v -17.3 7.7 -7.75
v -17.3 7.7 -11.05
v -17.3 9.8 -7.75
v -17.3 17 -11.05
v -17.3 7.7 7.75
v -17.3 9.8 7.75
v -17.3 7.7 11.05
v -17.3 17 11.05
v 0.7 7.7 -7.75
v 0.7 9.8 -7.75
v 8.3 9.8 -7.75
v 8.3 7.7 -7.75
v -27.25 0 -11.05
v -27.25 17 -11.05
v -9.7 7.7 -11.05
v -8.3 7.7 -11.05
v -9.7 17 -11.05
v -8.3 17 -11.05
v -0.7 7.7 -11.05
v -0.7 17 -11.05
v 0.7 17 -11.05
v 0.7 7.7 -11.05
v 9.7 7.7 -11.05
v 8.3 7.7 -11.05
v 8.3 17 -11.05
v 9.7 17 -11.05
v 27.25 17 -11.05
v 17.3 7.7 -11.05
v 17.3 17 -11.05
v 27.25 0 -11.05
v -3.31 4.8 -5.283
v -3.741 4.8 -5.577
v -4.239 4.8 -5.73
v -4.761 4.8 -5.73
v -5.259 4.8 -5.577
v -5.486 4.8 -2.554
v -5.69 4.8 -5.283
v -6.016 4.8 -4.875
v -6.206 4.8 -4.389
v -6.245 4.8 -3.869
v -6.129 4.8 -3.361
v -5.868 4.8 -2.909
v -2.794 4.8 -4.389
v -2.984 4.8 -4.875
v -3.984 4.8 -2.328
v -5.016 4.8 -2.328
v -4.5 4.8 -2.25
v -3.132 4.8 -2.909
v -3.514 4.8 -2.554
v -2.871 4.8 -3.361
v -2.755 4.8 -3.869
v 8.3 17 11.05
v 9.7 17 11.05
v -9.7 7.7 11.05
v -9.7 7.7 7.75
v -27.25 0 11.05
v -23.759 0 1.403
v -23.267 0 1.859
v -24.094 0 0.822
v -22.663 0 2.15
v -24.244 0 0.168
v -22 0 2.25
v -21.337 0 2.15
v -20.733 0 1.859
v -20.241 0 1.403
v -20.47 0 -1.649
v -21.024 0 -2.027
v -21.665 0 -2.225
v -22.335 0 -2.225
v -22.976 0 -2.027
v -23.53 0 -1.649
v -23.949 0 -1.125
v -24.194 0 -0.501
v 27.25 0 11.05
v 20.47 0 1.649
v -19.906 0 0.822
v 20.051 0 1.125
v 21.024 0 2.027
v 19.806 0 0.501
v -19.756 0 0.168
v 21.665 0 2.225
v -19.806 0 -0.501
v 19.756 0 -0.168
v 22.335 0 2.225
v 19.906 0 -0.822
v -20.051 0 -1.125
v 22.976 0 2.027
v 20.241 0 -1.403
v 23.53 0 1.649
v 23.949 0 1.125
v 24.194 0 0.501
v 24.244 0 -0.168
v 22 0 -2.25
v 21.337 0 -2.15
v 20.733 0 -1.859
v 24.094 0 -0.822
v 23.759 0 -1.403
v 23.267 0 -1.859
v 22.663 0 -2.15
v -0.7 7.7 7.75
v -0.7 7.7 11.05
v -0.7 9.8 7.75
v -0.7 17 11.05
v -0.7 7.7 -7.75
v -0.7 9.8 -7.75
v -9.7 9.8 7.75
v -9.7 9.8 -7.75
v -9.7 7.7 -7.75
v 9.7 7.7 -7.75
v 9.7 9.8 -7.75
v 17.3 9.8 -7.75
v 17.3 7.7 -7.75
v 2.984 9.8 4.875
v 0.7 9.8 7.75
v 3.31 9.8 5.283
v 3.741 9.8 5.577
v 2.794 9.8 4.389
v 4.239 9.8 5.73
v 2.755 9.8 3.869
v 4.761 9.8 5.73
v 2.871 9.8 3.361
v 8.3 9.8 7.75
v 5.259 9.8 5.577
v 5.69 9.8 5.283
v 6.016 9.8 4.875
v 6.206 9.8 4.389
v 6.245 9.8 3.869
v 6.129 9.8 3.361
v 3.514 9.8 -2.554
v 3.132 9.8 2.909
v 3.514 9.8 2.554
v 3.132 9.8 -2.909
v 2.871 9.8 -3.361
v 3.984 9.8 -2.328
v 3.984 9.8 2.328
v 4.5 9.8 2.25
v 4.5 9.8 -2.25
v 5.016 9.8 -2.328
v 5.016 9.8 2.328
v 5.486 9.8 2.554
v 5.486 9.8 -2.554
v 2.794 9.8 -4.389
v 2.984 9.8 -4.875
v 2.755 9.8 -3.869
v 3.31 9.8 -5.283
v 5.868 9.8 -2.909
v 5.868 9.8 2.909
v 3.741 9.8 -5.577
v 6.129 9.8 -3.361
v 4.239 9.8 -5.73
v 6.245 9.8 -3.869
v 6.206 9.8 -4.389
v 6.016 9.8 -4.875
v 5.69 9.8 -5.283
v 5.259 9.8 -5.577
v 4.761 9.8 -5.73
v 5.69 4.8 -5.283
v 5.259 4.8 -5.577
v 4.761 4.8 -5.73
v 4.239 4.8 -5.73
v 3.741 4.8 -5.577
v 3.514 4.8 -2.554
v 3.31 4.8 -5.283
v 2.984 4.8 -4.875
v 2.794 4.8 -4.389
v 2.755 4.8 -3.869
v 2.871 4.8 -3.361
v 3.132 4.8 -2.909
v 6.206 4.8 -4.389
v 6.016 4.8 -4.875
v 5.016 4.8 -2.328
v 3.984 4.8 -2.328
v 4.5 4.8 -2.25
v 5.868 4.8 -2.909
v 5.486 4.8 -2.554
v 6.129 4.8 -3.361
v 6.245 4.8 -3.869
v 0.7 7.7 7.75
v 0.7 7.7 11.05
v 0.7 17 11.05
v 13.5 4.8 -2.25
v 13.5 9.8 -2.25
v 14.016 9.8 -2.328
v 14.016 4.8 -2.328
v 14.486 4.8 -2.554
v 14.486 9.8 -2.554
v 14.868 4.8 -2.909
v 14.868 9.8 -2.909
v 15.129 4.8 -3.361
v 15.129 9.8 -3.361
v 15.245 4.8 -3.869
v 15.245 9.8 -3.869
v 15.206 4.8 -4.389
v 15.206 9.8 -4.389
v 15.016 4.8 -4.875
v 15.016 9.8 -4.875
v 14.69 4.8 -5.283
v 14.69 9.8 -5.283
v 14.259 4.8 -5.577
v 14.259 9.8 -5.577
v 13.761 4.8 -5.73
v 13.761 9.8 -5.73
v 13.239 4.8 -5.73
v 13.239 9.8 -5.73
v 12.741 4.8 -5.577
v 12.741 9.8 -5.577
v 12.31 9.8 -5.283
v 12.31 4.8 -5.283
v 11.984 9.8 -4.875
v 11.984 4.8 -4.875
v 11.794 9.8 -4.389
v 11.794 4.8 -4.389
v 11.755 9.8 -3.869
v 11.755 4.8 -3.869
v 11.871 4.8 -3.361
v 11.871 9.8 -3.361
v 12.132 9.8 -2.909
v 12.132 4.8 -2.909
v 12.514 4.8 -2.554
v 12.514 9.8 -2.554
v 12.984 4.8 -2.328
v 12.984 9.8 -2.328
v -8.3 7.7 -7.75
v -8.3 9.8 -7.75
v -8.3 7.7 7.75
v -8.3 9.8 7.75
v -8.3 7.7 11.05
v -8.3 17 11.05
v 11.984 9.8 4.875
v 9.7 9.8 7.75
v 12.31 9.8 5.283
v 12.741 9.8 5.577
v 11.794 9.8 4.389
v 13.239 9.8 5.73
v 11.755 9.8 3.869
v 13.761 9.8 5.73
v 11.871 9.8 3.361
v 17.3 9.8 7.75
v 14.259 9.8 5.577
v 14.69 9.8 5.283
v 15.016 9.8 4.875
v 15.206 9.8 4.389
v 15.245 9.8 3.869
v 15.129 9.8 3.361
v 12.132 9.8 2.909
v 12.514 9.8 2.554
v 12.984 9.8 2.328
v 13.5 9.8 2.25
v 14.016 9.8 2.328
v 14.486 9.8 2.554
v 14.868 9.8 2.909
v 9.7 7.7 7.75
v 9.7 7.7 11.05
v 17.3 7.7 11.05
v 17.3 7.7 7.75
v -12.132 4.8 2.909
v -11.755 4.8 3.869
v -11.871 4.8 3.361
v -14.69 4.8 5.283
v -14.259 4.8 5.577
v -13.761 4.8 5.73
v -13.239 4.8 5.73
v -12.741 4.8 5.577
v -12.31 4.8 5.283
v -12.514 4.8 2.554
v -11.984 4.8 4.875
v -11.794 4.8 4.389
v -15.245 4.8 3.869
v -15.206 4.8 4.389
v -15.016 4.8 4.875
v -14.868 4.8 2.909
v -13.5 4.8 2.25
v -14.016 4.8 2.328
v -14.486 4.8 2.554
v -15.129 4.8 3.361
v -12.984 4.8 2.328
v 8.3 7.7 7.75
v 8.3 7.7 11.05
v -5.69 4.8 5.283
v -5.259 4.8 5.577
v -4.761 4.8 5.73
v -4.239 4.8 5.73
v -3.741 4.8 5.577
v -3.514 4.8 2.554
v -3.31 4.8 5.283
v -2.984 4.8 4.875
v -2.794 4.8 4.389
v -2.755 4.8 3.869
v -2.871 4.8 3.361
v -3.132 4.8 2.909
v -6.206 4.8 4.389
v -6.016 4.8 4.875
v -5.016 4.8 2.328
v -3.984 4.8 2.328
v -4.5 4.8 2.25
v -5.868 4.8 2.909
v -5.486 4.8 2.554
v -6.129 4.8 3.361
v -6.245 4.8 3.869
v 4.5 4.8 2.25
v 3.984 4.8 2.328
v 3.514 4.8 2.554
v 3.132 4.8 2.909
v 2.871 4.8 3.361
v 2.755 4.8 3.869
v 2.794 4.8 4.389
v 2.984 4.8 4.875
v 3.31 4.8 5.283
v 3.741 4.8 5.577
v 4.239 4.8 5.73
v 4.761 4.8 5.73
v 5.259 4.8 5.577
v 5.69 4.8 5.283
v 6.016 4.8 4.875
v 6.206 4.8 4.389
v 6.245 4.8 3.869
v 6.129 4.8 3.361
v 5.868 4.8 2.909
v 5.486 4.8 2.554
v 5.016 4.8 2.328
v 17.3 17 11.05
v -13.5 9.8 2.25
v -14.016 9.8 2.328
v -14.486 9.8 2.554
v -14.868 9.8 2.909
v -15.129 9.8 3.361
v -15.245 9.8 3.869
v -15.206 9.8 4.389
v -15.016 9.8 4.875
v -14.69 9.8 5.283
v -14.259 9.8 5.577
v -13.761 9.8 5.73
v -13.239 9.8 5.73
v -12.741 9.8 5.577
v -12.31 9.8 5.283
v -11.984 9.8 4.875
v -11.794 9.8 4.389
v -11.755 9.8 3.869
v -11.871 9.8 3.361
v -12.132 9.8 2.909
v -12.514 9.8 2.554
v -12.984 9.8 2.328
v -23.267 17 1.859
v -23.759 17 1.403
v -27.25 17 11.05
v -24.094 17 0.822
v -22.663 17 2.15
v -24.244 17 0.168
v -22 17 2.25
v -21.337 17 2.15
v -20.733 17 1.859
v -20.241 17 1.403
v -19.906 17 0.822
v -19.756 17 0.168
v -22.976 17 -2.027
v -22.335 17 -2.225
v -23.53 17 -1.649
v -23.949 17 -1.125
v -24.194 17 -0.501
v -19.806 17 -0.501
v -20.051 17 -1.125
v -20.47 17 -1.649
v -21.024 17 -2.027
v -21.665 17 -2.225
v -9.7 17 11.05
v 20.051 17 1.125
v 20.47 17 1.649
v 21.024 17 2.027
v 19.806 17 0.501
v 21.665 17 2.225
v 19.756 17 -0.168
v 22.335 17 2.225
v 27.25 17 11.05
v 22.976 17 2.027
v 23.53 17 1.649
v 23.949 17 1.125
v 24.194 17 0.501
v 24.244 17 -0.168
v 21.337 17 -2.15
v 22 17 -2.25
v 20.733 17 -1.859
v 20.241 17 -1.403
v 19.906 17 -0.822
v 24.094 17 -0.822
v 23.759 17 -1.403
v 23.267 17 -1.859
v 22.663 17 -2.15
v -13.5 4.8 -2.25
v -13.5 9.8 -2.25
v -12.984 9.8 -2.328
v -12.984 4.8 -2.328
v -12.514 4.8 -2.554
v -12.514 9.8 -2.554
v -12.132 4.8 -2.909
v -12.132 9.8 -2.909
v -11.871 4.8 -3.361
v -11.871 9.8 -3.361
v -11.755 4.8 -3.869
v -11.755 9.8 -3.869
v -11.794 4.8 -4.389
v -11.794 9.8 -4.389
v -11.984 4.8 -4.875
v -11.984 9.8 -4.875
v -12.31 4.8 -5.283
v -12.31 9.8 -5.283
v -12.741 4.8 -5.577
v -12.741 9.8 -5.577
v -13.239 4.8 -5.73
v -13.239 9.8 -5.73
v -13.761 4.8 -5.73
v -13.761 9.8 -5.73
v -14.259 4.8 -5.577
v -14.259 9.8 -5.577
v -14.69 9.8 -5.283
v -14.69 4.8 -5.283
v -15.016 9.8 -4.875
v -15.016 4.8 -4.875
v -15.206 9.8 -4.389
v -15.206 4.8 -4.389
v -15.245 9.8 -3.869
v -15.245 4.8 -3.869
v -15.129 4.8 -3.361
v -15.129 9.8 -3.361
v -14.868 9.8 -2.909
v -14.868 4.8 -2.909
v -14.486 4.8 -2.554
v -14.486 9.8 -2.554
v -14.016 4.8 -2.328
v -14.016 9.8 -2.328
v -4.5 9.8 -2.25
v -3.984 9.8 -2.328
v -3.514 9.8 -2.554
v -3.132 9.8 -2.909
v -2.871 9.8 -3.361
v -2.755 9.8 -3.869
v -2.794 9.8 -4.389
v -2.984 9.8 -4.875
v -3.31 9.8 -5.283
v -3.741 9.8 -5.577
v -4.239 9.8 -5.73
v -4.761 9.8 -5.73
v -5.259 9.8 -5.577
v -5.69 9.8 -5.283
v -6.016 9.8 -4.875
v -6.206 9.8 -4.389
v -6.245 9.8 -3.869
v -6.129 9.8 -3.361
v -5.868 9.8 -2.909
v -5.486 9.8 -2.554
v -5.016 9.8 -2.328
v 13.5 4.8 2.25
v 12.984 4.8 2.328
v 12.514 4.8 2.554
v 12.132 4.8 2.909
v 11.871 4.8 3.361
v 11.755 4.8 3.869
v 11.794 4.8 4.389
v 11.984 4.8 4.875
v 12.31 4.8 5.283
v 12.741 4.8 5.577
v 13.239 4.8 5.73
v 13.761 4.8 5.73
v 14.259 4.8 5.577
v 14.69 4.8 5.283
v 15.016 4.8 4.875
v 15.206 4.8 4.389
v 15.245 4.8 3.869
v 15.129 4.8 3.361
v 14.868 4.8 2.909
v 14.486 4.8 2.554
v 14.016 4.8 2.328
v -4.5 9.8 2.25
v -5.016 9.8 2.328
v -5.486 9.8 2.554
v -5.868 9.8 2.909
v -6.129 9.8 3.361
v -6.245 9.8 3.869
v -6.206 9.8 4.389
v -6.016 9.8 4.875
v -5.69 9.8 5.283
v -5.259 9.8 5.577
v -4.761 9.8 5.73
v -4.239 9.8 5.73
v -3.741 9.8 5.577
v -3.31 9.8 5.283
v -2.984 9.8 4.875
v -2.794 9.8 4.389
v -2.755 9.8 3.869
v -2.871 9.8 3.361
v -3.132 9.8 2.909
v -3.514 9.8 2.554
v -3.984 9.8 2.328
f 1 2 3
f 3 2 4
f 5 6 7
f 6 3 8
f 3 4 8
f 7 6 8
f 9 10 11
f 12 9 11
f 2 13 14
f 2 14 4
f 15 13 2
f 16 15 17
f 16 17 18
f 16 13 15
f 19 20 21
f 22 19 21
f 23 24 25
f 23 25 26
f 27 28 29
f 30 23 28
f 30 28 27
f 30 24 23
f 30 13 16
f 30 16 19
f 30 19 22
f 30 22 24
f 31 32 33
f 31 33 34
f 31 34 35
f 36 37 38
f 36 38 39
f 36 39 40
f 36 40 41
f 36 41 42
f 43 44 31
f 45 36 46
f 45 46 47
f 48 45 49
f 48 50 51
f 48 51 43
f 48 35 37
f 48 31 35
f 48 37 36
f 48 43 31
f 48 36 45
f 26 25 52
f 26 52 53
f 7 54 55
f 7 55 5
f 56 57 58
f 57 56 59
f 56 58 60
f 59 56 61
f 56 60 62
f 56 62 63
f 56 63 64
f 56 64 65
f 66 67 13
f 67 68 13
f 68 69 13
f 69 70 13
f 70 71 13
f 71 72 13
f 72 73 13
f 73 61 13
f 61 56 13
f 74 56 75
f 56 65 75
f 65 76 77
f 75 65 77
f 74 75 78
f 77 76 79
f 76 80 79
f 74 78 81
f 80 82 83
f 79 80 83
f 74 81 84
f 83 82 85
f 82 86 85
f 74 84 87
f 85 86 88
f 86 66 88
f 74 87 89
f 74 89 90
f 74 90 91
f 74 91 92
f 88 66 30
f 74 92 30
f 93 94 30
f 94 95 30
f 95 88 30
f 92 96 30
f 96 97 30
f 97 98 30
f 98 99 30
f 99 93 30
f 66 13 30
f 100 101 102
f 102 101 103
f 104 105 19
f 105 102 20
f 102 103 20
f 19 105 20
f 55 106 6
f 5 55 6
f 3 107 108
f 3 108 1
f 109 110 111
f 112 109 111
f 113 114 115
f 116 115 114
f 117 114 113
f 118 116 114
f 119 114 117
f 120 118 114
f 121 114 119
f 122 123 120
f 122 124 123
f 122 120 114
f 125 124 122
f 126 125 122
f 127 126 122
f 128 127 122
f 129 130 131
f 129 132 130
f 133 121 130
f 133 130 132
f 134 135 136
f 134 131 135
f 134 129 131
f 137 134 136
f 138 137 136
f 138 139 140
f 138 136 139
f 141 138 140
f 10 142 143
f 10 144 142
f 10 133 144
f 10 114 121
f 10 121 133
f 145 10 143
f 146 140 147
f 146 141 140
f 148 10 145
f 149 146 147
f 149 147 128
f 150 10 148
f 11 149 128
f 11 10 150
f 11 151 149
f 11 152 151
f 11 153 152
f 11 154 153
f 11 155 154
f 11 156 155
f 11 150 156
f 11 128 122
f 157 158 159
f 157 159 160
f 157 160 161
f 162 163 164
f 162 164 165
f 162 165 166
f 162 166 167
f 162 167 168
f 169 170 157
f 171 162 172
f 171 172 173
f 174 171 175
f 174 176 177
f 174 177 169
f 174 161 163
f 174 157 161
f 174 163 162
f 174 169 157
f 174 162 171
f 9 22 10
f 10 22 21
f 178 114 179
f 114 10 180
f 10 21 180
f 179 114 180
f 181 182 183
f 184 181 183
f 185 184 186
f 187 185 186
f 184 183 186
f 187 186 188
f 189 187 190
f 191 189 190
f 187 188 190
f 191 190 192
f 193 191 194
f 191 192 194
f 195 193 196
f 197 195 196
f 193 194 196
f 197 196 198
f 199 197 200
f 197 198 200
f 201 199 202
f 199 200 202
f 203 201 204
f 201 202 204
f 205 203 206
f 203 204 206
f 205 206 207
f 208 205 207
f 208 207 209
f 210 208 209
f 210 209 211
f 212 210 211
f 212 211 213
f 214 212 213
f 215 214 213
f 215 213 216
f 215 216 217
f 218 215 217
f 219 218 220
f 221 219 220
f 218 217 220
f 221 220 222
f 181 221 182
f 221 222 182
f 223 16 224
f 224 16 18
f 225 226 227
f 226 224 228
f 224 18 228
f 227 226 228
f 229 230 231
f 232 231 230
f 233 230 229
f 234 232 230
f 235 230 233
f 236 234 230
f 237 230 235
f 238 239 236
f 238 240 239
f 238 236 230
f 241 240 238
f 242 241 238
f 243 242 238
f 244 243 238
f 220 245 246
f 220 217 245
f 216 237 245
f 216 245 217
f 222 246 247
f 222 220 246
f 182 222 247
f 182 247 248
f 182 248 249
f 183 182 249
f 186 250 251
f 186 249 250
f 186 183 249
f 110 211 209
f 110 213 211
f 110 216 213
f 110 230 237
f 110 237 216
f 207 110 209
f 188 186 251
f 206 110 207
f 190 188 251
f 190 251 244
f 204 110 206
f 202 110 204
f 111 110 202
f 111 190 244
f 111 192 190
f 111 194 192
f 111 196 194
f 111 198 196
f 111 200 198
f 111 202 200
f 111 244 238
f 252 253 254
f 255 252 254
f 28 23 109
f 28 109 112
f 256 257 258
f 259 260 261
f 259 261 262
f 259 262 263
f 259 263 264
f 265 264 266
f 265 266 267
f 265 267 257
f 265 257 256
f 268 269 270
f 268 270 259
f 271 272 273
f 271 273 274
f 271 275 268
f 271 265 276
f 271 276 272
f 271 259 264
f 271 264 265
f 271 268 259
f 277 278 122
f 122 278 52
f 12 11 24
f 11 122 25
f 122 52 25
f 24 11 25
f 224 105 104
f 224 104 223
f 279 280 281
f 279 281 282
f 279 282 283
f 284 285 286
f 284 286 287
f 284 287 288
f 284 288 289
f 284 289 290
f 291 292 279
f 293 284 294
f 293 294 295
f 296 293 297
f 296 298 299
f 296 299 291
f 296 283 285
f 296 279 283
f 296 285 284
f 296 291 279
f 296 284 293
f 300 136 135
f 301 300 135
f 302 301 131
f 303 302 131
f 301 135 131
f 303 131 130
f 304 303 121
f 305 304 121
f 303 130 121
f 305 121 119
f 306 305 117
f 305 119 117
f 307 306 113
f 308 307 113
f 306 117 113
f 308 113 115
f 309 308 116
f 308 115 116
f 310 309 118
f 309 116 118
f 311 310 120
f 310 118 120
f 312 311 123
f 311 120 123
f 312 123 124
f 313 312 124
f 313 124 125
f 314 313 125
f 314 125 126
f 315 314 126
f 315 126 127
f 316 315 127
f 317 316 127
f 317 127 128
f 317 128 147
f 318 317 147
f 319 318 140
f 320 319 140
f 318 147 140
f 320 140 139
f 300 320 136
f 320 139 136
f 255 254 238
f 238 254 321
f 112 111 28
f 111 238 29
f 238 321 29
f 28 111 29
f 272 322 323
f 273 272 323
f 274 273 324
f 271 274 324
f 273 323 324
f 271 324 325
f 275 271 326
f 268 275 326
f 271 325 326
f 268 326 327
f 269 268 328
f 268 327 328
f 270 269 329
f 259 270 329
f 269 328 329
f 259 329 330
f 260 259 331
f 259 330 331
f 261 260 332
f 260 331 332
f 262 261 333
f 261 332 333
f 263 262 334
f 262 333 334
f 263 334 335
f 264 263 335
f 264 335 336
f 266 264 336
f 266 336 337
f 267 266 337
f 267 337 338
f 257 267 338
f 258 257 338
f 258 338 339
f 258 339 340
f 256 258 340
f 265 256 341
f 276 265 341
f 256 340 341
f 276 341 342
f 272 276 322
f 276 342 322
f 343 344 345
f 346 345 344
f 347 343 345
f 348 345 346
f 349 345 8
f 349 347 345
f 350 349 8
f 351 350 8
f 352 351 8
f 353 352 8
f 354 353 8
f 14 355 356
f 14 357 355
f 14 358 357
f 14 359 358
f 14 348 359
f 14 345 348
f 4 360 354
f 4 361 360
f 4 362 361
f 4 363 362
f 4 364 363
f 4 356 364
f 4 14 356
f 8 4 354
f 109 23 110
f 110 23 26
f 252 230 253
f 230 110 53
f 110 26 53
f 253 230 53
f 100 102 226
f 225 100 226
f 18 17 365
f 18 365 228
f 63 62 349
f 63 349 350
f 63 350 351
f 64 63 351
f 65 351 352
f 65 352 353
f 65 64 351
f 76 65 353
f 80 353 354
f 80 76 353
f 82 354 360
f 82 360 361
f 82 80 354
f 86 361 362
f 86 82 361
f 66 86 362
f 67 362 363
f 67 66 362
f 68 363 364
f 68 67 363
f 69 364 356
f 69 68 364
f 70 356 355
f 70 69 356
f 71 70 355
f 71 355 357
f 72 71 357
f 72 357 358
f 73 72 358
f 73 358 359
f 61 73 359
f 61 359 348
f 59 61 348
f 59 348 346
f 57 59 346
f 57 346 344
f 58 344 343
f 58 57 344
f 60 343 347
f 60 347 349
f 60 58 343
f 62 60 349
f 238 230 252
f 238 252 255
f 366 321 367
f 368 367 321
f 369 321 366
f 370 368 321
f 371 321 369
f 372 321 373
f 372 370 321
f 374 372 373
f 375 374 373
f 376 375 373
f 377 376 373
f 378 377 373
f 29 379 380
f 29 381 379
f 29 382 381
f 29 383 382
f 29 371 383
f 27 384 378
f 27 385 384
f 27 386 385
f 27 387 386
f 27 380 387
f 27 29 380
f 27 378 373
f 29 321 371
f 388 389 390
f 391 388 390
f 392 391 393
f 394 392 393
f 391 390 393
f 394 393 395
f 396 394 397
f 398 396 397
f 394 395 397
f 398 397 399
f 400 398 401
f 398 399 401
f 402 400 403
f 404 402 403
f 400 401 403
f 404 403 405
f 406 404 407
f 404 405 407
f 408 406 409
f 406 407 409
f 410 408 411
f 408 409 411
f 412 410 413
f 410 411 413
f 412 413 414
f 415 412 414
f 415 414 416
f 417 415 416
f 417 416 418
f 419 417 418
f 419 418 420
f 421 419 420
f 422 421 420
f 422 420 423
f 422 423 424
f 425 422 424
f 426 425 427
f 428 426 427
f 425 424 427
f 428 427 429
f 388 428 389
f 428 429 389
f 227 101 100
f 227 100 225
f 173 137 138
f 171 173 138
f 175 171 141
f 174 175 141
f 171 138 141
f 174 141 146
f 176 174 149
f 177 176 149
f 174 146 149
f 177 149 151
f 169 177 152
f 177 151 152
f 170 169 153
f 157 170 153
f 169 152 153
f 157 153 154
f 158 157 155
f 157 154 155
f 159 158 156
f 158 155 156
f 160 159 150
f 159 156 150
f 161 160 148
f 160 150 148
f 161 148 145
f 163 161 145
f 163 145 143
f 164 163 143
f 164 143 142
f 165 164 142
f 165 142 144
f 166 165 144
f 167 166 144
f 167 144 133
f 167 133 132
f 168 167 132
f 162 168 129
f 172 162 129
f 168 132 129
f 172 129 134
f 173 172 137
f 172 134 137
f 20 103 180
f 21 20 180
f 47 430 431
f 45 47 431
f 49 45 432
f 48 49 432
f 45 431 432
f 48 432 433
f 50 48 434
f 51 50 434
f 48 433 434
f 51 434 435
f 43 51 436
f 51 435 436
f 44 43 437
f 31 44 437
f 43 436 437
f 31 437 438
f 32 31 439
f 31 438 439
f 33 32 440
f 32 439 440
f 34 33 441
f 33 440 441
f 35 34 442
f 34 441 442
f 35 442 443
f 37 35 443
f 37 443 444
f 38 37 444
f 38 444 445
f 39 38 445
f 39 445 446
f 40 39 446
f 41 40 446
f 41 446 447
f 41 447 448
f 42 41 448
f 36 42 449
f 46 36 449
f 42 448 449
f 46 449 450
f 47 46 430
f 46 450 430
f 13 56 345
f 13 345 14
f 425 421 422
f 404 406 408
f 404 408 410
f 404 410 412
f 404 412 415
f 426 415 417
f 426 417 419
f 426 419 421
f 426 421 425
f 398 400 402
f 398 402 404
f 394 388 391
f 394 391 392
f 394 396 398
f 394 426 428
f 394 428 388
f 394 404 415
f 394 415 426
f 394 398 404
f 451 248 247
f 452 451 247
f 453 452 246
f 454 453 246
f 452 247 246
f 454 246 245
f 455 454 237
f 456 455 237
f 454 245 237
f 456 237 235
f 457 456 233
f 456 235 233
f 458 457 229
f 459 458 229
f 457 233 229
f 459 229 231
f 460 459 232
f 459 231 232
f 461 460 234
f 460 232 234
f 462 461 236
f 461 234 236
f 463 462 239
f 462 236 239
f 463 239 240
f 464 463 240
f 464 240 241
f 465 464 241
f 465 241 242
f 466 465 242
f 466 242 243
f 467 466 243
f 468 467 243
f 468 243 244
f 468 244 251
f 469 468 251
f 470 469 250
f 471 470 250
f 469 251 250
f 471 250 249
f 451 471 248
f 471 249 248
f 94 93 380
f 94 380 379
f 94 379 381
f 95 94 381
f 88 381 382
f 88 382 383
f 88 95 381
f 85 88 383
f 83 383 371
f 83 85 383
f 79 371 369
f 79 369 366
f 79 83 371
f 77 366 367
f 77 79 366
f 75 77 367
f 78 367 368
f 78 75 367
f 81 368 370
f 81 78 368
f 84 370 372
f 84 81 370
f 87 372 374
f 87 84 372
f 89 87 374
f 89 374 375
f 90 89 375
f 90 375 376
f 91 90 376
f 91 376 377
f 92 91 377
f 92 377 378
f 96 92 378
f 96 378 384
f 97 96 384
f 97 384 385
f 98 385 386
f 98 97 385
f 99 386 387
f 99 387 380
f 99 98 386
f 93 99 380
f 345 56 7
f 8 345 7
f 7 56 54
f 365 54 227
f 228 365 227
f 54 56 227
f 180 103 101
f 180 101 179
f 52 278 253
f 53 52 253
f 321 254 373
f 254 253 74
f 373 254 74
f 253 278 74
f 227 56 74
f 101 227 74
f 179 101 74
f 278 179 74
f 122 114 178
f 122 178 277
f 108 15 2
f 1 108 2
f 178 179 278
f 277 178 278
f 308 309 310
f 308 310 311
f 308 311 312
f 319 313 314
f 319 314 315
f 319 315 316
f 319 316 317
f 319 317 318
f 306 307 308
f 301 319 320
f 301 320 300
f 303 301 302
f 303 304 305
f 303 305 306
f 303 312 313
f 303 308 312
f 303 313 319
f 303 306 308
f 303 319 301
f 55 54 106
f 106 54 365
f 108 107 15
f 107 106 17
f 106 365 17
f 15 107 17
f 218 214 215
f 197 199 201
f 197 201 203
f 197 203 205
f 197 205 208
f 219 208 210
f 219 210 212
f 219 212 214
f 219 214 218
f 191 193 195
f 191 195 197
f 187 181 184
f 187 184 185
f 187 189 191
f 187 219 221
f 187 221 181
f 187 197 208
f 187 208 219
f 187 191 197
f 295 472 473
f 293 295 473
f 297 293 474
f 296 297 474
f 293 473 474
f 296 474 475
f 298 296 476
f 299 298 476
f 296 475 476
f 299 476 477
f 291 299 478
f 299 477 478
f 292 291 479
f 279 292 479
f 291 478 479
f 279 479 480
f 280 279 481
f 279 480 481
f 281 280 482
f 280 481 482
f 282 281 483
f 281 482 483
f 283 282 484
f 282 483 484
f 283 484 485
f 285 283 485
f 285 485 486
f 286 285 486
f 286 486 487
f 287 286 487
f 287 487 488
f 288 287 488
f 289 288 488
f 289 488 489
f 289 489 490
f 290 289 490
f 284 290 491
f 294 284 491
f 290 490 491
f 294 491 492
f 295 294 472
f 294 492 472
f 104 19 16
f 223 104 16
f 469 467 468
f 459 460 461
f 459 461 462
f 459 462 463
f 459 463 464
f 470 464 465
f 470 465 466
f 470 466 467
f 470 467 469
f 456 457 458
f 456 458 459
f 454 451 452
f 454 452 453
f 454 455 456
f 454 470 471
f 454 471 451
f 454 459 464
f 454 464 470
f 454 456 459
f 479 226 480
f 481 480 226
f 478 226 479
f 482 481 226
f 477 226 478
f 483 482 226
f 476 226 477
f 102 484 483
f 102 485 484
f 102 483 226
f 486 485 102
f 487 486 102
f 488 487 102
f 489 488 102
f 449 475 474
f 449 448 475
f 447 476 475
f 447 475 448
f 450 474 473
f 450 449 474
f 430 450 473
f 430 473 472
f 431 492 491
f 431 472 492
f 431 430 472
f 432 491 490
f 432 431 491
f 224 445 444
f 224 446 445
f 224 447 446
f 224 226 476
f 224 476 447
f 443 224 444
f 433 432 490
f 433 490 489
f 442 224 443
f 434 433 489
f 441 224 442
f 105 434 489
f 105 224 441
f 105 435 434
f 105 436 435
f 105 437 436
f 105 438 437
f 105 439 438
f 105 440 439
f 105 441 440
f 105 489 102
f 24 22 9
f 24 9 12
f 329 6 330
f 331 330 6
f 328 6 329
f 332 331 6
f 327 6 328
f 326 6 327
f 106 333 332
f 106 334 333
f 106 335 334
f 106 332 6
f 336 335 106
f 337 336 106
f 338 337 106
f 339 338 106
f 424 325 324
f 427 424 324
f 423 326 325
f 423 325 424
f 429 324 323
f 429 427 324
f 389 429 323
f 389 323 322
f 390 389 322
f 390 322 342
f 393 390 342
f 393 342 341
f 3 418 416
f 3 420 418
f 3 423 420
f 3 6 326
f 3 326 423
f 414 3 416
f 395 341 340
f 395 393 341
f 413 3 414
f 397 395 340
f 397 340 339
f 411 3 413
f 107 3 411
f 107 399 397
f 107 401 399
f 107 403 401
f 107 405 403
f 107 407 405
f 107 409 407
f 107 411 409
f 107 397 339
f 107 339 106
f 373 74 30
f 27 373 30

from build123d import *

# Parameters (mm, degrees)
SKETCH_1_W               = 54.5
SKETCH_1_H               = 22.1
SKETCH_1_R               = 2.25
EXTRUDE_1_DEPTH          = 17
SKETCH_2_W               = 7.6
SKETCH_2_H               = 22.1
CUT_EXTRUDE_1_DEPTH      = 7.2
SKETCH_3_W               = 7.6
SKETCH_3_H               = 3.3
CUT_EXTRUDE_2_DEPTH      = 2.1
MIRROR_2_COPY_1_SKETCH_W = 7.6
MIRROR_2_COPY_1_SKETCH_H = 3.3
MIRROR_2_COPY_1_DEPTH    = 2.1
SKETCH_4_R               = 1.75
CUT_EXTRUDE_3_DEPTH      = 5


with BuildPart() as part:
    # ｽｹｯﾁ1 → ﾎﾞｽ - 押し出し1 (new body)
    with BuildSketch(Plane(origin=(0, 0, 0), x_dir=(1, 0, 0), z_dir=(0, 1, 0))):
        Rectangle(SKETCH_1_W, SKETCH_1_H)
        with Locations(Location((-22, 0, 0), (0, 0, 270))):
            Circle(SKETCH_1_R, mode=Mode.SUBTRACT)
        with Locations(Location((22, 0, 0), (0, 0, 90))):
            Circle(SKETCH_1_R, mode=Mode.SUBTRACT)
    extrude(amount=EXTRUDE_1_DEPTH)

    # ｽｹｯﾁ2 → ｶｯﾄ - 押し出し1 (cut)
    with BuildSketch(Plane(origin=(0, 17, 0), x_dir=(1, 0, 0), z_dir=(0, 1, 0))):
        with Locations((13.5, 0)):
            Rectangle(SKETCH_2_W, SKETCH_2_H)
        with Locations((-13.5, 0)):
            Rectangle(SKETCH_2_W, SKETCH_2_H)
        with Locations((-4.5, 0)):
            Rectangle(SKETCH_2_W, SKETCH_2_H)
        with Locations((4.5, 0)):
            Rectangle(SKETCH_2_W, SKETCH_2_H)
    extrude(amount=-CUT_EXTRUDE_1_DEPTH, mode=Mode.SUBTRACT)

    # ｽｹｯﾁ3 → ｶｯﾄ - 押し出し2 (cut)
    with BuildSketch(Plane(origin=(0, 9.8, 0), x_dir=(1, 0, 0), z_dir=(0, 1, 0))):
        with Locations((4.5, 9.4)):
            Rectangle(SKETCH_3_W, SKETCH_3_H)
        with Locations((13.5, 9.4)):
            Rectangle(SKETCH_3_W, SKETCH_3_H)
    cut_extrude_2 = extrude(amount=-CUT_EXTRUDE_2_DEPTH, mode=Mode.SUBTRACT)

    # ﾐﾗｰ1: ｶｯﾄ - 押し出し2 across plane
    add(cut_extrude_2.mirror(Plane(origin=(0, 0, 0), x_dir=(0, 0, 1), z_dir=(1, 0, 0))), mode=Mode.SUBTRACT)

    # ﾐﾗｰ2: ｶｯﾄ - 押し出し2 across plane
    add(cut_extrude_2.mirror(Plane.XY), mode=Mode.SUBTRACT)

    # ﾐﾗｰ2 copy 1 sketch → ﾐﾗｰ2 copy 1 (cut)
    with BuildSketch(Plane(origin=(0, 9.8, 0), x_dir=(-1, 0, 0), z_dir=(0, 1, 0))):
        with Locations((4.5, 9.4)):
            Rectangle(MIRROR_2_COPY_1_SKETCH_W, MIRROR_2_COPY_1_SKETCH_H)
        with Locations((13.5, 9.4)):
            Rectangle(MIRROR_2_COPY_1_SKETCH_W, MIRROR_2_COPY_1_SKETCH_H)
    extrude(amount=-MIRROR_2_COPY_1_DEPTH, mode=Mode.SUBTRACT)

    # ｽｹｯﾁ4 → ｶｯﾄ - 押し出し3 (cut)
    with BuildSketch(Plane(origin=(0, 9.8, 0), x_dir=(1, 0, 0), z_dir=(0, 1, 0))):
        with Locations(Location((13.5, 4, 0), (0, 0, 270))):
            Circle(SKETCH_4_R)
        with Locations(Location((4.5, 4, 0), (0, 0, 270))):
            Circle(SKETCH_4_R)
        with Locations(Location((-4.5, 4, 0), (0, 0, 270))):
            Circle(SKETCH_4_R)
        with Locations(Location((-13.5, 4, 0), (0, 0, 270))):
            Circle(SKETCH_4_R)
        with Locations(Location((13.5, -4, 0), (0, 0, 90))):
            Circle(SKETCH_4_R)
        with Locations(Location((4.5, -4, 0), (0, 0, 90))):
            Circle(SKETCH_4_R)
        with Locations(Location((-4.5, -4, 0), (0, 0, 90))):
            Circle(SKETCH_4_R)
        with Locations(Location((-13.5, -4, 0), (0, 0, 90))):
            Circle(SKETCH_4_R)
    extrude(amount=-CUT_EXTRUDE_3_DEPTH, mode=Mode.SUBTRACT)


solid = part.part
